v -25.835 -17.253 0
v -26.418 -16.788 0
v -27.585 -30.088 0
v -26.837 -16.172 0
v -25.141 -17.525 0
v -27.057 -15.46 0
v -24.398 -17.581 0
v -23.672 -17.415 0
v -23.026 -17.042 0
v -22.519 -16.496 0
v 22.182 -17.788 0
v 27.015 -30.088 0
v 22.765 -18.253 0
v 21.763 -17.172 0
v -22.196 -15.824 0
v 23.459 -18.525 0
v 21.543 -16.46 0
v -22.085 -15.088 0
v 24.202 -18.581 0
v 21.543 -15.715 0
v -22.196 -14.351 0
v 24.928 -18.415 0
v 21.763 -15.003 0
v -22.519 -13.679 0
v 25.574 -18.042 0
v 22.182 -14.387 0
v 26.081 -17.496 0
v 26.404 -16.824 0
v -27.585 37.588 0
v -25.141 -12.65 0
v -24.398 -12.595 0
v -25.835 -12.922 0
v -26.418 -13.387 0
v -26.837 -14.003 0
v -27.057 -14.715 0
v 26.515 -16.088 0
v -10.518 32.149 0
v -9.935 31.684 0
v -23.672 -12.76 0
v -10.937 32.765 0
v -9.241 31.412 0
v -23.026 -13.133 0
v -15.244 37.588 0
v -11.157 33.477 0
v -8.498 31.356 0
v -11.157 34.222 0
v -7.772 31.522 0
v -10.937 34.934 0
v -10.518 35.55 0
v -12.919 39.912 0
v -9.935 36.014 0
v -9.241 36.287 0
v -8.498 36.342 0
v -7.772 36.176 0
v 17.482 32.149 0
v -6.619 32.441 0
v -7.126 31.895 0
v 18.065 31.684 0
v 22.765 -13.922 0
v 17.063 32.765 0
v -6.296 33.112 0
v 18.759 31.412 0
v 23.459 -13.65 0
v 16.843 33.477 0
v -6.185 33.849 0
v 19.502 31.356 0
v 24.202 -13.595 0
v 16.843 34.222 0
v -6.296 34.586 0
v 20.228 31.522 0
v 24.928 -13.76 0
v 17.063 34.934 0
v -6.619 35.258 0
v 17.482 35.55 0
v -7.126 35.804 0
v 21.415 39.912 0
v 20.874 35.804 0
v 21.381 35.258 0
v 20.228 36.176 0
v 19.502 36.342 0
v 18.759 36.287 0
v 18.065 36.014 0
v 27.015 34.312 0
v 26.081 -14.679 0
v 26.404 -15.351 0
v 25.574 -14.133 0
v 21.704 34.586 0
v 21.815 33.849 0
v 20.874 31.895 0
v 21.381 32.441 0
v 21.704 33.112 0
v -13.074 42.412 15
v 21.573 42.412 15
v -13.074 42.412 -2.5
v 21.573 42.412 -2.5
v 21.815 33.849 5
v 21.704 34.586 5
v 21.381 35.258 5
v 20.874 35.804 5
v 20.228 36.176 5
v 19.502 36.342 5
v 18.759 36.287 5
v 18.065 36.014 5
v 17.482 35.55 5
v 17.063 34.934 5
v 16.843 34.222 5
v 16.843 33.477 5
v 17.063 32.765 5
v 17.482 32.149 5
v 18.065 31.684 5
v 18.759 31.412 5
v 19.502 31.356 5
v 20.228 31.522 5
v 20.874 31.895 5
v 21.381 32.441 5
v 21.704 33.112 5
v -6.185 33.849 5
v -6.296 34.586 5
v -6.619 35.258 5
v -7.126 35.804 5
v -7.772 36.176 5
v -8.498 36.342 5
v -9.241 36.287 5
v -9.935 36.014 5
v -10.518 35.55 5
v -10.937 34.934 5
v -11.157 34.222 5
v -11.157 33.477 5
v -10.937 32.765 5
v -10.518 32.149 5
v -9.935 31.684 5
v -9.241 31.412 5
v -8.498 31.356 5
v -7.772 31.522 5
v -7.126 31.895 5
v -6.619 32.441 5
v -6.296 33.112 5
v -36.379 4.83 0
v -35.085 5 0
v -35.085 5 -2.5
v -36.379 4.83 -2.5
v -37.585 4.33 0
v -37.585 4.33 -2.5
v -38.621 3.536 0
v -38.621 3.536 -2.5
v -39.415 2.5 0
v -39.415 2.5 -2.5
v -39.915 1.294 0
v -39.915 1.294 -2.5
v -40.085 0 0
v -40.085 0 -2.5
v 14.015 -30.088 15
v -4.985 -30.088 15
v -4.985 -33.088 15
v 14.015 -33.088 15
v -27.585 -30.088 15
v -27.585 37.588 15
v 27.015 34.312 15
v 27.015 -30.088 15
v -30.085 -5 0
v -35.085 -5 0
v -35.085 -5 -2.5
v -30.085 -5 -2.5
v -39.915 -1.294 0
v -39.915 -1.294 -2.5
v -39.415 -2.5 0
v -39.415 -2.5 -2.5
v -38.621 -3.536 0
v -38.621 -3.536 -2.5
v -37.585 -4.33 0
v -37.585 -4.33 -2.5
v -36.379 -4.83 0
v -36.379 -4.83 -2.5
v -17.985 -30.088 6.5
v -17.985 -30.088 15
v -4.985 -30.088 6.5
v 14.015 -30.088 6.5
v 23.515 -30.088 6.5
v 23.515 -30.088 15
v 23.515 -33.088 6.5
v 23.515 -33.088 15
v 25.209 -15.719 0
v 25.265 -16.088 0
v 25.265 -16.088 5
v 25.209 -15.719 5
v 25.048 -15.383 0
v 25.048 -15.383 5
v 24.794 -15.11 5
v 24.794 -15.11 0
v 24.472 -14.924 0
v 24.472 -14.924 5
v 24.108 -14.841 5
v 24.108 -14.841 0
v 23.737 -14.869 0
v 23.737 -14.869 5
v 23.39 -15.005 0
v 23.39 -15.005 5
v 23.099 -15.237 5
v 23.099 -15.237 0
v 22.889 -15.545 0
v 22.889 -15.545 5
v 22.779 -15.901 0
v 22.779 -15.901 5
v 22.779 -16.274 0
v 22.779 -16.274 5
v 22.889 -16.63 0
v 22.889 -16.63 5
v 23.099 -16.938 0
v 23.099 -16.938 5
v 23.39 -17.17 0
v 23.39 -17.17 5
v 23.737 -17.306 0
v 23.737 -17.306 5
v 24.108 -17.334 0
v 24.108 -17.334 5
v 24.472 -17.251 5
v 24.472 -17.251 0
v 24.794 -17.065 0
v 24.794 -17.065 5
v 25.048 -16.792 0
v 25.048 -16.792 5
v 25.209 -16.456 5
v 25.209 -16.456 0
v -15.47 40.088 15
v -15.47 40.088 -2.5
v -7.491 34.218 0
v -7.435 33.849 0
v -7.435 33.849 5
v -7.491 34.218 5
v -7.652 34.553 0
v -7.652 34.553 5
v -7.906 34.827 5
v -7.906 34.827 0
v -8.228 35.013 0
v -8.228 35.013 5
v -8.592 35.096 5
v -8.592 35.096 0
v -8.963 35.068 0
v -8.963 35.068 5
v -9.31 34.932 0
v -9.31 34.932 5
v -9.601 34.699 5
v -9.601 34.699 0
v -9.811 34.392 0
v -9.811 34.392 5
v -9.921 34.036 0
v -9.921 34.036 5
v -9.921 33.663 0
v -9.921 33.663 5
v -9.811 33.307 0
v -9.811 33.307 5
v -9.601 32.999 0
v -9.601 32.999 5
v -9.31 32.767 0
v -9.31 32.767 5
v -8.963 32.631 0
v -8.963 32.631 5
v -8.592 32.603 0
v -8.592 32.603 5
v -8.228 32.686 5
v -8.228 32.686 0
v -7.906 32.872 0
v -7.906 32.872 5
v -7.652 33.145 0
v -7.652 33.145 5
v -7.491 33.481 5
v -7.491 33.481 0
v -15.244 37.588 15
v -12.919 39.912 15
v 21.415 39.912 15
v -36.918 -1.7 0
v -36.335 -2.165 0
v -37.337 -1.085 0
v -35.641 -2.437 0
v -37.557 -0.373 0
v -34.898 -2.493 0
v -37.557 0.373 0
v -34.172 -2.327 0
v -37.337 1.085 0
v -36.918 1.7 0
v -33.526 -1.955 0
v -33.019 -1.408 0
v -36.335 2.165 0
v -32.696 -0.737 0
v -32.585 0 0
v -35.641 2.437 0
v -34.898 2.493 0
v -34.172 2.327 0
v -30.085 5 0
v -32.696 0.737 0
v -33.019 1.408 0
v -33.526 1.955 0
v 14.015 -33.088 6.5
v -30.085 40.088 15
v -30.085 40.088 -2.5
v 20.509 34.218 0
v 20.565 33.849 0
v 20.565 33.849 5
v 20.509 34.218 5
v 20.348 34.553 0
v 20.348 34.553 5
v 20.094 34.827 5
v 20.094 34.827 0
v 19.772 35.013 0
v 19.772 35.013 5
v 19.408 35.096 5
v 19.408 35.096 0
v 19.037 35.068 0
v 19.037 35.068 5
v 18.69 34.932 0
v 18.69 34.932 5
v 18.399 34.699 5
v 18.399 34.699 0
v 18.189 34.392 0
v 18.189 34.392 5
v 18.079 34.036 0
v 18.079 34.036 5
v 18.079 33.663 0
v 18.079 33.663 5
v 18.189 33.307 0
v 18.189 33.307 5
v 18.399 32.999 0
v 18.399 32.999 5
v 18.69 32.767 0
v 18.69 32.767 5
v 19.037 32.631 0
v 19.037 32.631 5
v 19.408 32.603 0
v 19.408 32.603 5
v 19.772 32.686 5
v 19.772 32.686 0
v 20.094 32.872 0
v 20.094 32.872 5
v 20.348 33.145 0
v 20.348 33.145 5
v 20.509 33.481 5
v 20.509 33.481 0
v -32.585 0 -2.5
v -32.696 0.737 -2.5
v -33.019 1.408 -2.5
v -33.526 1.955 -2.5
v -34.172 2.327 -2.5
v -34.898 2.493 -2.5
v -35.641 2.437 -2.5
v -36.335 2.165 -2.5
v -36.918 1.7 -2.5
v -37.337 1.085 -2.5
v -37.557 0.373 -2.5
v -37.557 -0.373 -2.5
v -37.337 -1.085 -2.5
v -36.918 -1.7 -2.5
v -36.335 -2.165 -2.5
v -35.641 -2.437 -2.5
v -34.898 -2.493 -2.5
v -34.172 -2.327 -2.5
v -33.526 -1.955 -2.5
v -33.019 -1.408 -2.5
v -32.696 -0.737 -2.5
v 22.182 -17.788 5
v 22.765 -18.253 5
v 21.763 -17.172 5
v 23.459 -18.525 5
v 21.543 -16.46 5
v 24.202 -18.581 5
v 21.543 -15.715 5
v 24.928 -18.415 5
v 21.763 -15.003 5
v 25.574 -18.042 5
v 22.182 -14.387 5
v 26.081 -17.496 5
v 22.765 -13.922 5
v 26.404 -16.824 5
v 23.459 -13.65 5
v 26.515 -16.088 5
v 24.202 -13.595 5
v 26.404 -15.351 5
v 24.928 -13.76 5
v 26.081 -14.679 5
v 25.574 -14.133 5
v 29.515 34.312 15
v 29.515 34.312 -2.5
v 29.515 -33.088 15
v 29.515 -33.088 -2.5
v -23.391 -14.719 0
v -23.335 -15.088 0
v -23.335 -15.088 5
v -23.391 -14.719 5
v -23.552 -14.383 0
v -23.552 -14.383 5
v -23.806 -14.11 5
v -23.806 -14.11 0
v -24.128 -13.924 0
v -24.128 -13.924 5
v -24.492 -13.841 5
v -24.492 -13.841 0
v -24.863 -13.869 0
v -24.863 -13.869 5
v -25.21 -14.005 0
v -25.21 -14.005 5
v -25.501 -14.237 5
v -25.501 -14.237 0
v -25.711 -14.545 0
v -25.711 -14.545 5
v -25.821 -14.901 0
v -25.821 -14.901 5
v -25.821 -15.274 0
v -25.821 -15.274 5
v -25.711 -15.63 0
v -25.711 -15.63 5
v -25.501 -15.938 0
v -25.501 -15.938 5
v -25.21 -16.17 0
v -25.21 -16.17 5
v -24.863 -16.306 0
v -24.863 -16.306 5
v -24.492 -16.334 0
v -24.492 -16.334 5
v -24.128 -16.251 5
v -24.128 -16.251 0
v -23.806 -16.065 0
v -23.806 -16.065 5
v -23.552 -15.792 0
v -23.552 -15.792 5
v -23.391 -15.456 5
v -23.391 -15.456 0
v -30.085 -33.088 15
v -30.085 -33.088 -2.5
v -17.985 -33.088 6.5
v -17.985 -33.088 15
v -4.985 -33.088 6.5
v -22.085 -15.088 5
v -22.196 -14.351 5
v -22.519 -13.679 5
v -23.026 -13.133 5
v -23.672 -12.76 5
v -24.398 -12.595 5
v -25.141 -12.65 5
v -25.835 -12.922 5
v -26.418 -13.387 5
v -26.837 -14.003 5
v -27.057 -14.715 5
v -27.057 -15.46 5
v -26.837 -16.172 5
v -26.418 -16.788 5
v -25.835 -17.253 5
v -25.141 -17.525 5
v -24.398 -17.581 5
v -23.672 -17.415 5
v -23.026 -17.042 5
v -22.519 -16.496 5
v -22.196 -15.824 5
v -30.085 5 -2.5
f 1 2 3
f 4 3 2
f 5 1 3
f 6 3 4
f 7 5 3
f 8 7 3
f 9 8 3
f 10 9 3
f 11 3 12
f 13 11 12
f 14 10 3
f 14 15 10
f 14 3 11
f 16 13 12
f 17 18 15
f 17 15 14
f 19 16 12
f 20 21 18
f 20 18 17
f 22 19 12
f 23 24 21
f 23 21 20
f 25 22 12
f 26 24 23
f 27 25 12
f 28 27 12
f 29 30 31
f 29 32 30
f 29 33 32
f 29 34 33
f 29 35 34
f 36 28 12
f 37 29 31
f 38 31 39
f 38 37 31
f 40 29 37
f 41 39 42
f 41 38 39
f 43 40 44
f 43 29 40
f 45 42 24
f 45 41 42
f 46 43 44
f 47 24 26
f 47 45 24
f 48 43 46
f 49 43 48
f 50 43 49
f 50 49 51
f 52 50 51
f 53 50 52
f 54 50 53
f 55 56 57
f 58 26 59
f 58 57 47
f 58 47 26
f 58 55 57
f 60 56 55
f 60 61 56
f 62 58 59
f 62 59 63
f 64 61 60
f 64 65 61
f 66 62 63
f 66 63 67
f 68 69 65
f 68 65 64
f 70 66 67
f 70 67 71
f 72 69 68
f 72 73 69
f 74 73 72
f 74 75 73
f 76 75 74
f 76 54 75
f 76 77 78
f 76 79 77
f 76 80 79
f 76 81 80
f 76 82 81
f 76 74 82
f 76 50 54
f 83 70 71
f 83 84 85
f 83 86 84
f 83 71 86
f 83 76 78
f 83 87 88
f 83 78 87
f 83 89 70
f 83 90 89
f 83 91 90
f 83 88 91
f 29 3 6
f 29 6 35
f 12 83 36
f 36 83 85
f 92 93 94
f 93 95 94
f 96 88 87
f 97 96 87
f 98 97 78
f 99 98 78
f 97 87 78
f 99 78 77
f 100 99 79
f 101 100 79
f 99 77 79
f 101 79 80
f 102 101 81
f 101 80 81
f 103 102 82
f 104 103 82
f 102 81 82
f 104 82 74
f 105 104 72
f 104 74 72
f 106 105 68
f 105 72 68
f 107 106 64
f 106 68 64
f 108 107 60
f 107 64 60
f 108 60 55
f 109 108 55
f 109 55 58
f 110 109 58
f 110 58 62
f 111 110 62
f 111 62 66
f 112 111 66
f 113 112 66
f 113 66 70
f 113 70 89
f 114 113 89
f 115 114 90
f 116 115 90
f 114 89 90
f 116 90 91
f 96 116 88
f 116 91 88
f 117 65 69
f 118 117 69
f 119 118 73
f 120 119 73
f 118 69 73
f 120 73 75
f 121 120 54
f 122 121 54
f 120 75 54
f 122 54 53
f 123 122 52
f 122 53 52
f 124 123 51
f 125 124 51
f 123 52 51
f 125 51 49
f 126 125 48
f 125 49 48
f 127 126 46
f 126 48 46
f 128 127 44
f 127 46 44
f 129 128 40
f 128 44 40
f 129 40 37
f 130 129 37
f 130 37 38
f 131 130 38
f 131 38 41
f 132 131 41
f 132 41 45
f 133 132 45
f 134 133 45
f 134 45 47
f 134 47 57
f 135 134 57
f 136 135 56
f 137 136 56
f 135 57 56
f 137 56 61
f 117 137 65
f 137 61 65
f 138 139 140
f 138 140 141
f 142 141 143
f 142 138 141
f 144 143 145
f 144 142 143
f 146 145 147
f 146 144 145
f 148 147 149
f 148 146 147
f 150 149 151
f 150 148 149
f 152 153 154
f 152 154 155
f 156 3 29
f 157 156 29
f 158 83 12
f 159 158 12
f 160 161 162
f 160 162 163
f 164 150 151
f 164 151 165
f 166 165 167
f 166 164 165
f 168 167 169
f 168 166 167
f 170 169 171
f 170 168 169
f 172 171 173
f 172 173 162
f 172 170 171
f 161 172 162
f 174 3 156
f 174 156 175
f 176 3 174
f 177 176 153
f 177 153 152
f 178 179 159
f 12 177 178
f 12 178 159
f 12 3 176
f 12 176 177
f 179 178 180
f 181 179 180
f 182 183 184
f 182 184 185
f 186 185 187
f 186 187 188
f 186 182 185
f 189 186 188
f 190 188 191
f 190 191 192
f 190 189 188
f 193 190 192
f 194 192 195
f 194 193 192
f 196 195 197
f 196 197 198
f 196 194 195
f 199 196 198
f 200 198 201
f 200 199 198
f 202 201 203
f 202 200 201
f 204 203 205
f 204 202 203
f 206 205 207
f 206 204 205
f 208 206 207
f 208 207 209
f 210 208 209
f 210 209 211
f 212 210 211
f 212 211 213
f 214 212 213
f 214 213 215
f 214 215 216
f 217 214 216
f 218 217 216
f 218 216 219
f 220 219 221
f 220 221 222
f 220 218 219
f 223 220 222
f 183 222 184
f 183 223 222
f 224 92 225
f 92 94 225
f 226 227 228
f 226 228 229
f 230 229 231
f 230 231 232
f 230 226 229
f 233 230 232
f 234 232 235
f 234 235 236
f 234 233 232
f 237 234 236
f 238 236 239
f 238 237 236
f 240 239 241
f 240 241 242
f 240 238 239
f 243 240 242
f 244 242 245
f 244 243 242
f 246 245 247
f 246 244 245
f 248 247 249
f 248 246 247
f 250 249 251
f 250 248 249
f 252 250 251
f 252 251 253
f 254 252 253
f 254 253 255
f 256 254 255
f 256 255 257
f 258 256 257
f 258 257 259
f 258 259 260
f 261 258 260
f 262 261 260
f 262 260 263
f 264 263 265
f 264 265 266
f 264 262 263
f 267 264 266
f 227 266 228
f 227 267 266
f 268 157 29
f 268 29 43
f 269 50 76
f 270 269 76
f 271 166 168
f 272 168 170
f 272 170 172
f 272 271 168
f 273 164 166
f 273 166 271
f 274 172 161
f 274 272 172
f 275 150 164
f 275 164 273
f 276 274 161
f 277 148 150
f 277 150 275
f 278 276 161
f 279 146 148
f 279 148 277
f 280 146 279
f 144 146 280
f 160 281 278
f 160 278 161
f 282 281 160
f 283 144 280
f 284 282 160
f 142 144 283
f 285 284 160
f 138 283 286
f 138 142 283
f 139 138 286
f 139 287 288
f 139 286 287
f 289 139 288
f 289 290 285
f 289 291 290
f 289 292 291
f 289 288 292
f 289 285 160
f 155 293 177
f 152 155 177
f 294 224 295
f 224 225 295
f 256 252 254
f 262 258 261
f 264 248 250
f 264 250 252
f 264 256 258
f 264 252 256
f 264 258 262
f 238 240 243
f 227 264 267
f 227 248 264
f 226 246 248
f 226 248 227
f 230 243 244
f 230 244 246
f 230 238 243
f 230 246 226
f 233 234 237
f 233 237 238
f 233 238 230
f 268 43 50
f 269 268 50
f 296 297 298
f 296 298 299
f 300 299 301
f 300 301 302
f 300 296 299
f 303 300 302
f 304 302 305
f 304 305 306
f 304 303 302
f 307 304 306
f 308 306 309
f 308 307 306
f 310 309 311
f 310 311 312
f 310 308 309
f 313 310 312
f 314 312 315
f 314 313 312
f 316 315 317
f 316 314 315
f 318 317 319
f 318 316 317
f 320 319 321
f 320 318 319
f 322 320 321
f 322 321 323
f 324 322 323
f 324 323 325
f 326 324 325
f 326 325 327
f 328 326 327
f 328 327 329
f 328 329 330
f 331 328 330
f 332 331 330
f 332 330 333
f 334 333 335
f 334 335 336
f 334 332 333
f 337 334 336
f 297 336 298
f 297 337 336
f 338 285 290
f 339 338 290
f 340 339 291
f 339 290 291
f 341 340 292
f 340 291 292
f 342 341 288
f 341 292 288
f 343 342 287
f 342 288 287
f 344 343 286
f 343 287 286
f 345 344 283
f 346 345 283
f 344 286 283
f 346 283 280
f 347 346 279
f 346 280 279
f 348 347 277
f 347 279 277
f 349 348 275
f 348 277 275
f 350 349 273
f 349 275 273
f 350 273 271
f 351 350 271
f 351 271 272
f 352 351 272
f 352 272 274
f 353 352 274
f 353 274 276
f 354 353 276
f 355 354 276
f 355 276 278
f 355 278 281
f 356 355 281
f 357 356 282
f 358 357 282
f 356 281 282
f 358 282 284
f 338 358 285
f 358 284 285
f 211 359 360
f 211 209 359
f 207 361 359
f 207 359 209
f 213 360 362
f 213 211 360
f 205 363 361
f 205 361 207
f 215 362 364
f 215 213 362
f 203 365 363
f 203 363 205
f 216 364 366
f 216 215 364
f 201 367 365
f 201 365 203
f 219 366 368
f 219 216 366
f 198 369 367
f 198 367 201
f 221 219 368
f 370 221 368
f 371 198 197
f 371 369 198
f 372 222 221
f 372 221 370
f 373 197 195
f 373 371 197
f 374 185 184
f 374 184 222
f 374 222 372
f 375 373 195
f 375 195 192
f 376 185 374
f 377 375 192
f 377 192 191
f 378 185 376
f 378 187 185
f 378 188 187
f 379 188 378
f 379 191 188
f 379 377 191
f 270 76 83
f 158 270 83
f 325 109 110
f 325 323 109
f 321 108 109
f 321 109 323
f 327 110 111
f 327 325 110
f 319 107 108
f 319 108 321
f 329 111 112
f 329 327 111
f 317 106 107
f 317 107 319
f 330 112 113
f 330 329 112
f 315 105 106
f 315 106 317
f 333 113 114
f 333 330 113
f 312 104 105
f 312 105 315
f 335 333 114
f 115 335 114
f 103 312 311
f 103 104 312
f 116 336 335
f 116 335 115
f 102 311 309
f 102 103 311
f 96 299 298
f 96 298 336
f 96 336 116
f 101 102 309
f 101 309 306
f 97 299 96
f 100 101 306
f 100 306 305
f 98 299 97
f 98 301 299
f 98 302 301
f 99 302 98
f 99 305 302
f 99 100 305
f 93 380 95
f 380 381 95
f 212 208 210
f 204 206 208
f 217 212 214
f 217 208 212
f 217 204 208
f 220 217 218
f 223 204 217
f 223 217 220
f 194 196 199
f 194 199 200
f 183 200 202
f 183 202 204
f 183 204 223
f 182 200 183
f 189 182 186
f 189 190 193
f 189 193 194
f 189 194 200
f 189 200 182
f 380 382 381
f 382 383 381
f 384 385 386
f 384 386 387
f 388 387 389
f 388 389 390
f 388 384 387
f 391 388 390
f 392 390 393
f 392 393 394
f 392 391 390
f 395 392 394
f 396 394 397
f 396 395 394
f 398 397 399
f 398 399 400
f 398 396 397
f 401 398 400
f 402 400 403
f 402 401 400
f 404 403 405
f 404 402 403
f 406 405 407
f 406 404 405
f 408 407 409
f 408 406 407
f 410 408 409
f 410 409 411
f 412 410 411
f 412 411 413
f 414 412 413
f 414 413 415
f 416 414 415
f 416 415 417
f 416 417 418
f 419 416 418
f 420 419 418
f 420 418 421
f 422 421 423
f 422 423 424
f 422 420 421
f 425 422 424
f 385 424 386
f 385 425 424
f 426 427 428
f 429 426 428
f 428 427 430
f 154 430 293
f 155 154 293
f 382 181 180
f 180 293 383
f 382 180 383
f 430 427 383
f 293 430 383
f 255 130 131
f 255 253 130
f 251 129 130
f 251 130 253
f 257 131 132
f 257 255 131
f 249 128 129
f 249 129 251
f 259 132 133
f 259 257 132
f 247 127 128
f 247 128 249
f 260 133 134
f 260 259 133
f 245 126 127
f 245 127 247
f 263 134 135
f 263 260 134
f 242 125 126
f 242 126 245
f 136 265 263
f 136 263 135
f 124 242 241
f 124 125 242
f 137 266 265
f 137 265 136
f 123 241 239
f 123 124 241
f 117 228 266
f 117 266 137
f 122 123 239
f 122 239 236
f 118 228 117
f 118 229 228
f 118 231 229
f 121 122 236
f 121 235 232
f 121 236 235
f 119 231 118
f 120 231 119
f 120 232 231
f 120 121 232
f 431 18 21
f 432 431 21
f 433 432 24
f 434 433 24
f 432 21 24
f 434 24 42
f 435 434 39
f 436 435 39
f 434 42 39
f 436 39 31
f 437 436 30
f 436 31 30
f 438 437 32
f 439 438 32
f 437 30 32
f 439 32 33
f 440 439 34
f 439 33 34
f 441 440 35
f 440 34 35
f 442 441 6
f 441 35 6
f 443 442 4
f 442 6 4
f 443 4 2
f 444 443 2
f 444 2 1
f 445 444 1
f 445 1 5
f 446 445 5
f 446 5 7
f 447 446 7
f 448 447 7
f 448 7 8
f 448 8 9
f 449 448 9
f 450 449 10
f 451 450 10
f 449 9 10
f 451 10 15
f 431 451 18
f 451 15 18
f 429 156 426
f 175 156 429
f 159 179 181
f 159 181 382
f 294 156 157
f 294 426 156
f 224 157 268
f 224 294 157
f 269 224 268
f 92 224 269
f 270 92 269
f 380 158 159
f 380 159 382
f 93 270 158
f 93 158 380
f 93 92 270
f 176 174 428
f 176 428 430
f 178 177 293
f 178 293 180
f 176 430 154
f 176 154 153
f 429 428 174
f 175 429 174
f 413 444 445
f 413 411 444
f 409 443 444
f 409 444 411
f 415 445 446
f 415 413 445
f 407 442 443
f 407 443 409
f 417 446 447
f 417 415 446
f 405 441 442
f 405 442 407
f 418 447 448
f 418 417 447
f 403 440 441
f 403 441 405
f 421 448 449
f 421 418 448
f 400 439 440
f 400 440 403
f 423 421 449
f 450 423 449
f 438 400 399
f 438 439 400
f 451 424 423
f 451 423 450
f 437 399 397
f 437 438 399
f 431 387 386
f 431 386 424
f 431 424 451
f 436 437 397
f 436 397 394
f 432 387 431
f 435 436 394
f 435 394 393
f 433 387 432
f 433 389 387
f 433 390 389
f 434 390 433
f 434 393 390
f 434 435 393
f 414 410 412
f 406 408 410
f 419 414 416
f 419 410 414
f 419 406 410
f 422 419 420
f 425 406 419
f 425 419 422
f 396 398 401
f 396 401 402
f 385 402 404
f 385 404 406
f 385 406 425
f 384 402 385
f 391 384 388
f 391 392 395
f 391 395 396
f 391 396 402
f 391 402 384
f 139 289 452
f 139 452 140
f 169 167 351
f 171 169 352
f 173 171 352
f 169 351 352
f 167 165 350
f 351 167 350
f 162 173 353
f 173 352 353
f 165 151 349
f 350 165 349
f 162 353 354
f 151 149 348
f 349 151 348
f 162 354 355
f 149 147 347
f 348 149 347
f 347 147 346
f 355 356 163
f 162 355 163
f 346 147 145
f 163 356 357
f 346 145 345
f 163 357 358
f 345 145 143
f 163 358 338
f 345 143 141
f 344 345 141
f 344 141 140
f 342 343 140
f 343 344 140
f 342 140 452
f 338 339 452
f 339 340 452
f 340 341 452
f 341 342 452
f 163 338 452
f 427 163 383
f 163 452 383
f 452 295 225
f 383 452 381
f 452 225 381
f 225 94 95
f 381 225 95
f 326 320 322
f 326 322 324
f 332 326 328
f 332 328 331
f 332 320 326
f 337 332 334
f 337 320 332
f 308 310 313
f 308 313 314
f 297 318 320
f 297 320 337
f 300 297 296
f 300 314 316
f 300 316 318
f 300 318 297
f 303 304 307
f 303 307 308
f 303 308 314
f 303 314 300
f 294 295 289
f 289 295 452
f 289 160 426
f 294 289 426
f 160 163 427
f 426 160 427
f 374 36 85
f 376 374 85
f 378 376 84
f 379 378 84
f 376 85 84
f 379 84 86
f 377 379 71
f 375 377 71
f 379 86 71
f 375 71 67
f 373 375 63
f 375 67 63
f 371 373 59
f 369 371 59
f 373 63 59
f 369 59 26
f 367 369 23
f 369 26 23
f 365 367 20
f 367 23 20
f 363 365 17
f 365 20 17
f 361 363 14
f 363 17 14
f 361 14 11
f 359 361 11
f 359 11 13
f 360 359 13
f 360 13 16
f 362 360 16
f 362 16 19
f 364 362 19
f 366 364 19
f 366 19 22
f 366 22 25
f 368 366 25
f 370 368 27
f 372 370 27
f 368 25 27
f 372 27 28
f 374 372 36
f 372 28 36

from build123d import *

# Parameters (mm, degrees)
F0_R     = 2.5
F0_W     = 19
F0_H     = 3
F0_W_2   = 13
F0_W_3   = 9.5
F0_R_2   = 1.25
F1_DEPTH = 2.5
F2_DEPTH = 15
F3_DEPTH = 6.5
F4_DEPTH = 2.5
F5_DEPTH = 5


# Not quite as in the source:
# - a feature names something its author has since deleted; it is built from what else it names


with BuildPart() as f1:
    # F0 (on Top) → F1 (new body)
    with BuildSketch(Plane.XY):
        Polygon((27.0149873525, -30.0875452161), (27.0149873525, 34.3124547839), (21.4149873525, 39.9124547839), (-12.9189450768, 39.9124547839), (-15.2438546447, 37.5875452161), (-27.5850126475, 37.5875452161), (-27.5850126475, -30.0875452161), (-17.9850126475, -30.0875452161), (-4.9850126475, -30.0875452161), (14.0149873525, -30.0875452161), (23.5149873525, -30.0875452161), align=None)
        with Locations((-24.5850126475, -15.0875452161)):
            Circle(F0_R, mode=Mode.SUBTRACT)
        with Locations((24.0149873525, -16.0875452161)):
            Circle(F0_R, mode=Mode.SUBTRACT)
        with Locations((-8.6850126475, 33.8492766023)):
            Circle(F0_R, mode=Mode.SUBTRACT)
        with Locations((19.3149873525, 33.8492766023)):
            Circle(F0_R, mode=Mode.SUBTRACT)
        Polygon((21.4149873525, 39.9124547839), (27.0149873525, 34.3124547839), (27.0149873525, -30.0875452161), (29.5149873525, -30.0875452161), (29.5149873525, 34.3124547839), (21.5734839439, 42.4124547839), (-13.0739709929, 42.4124547839), (-15.4701419023, 40.0875452161), (-30.0850126475, 40.0875452161), (-30.0850126475, 10), (-30.0850126475, 5), (-30.0850126475, 0), (-30.0850126475, -5), (-30.0850126475, -30.0875452161), (-27.5850126475, -30.0875452161), (-27.5850126475, 37.5875452161), (-15.2438546447, 37.5875452161), (-12.9189450768, 39.9124547839), align=None)
        with Locations((4.5149873525, -31.5875452161)):
            Rectangle(F0_W, F0_H)
        with Locations((-11.4850126475, -31.5875452161)):
            Rectangle(F0_W_2, F0_H)
        Polygon((-17.9850126475, -33.0875452161), (-17.9850126475, -30.0875452161), (-27.5850126475, -30.0875452161), (-30.0850126475, -30.0875452161), (-30.0850126475, -33.0875452161), align=None)
        with Locations((18.7649873525, -31.5875452161)):
            Rectangle(F0_W_3, F0_H)
        with Locations((19.3149873525, 33.8492766023)):
            Circle(F0_R)
        with Locations((19.3149873525, 33.8492766023)):
            Circle(F0_R_2, mode=Mode.SUBTRACT)
        with Locations((-24.5850126475, -15.0875452161)):
            Circle(F0_R)
        with Locations((-24.5850126475, -15.0875452161)):
            Circle(F0_R_2, mode=Mode.SUBTRACT)
        with Locations((24.0149873525, -16.0875452161)):
            Circle(F0_R)
        with Locations((24.0149873525, -16.0875452161)):
            Circle(F0_R_2, mode=Mode.SUBTRACT)
        with Locations((-8.6850126475, 33.8492766023)):
            Circle(F0_R)
        with Locations((-8.6850126475, 33.8492766023)):
            Circle(F0_R_2, mode=Mode.SUBTRACT)
        Polygon((29.5149873525, -30.0875452161), (27.0149873525, -30.0875452161), (23.5149873525, -30.0875452161), (23.5149873525, -33.0875452161), (29.5149873525, -33.0875452161), align=None)
        with Locations((-24.5850126475, -15.0875452161)):
            Circle(F0_R_2)
        with Locations((24.0149873525, -16.0875452161)):
            Circle(F0_R_2)
        with Locations((-8.6850126475, 33.8492766023)):
            Circle(F0_R_2)
        with Locations((19.3149873525, 33.8492766023)):
            Circle(F0_R_2)
    extrude(amount=-F1_DEPTH)

    # F0 (on Top) → F2 (join)
    with BuildSketch(Plane.XY):
        Polygon((21.4149873525, 39.9124547839), (27.0149873525, 34.3124547839), (27.0149873525, -30.0875452161), (29.5149873525, -30.0875452161), (29.5149873525, 34.3124547839), (21.5734839439, 42.4124547839), (-13.0739709929, 42.4124547839), (-15.4701419023, 40.0875452161), (-30.0850126475, 40.0875452161), (-30.0850126475, 10), (-30.0850126475, 5), (-30.0850126475, 0), (-30.0850126475, -5), (-30.0850126475, -30.0875452161), (-27.5850126475, -30.0875452161), (-27.5850126475, 37.5875452161), (-15.2438546447, 37.5875452161), (-12.9189450768, 39.9124547839), align=None)
        Polygon((-17.9850126475, -33.0875452161), (-17.9850126475, -30.0875452161), (-27.5850126475, -30.0875452161), (-30.0850126475, -30.0875452161), (-30.0850126475, -33.0875452161), align=None)
        with Locations((4.5149873525, -31.5875452161)):
            Rectangle(F0_W, F0_H)
        Polygon((29.5149873525, -30.0875452161), (27.0149873525, -30.0875452161), (23.5149873525, -30.0875452161), (23.5149873525, -33.0875452161), (29.5149873525, -33.0875452161), align=None)
    extrude(amount=F2_DEPTH)

    # F0 (on Top) → F3 (join)
    with BuildSketch(Plane.XY):
        with Locations((-11.4850126475, -31.5875452161)):
            Rectangle(F0_W_2, F0_H)
        with Locations((18.7649873525, -31.5875452161)):
            Rectangle(F0_W_3, F0_H)
    extrude(amount=F3_DEPTH)

    # F0 (on Top) → F4 (join)
    with BuildSketch(Plane.XY):
        with BuildLine():
            Line((-35.0850126475, -5), (-30.0850126475, -5))
            Line((-30.0850126475, -5), (-30.0850126475, 0))
            Line((-30.0850126475, 0), (-30.0850126475, 5))
            Line((-30.0850126475, 5), (-35.0850126475, 5))
            ThreePointArc((-35.0850126475, 5), (-38.6205465534, 3.5355339059), (-40.0850126475, 0))
            ThreePointArc((-40.0850126475, 0), (-38.6205465534, -3.5355339059), (-35.0850126475, -5))
        make_face()
        with Locations((-35.0850126475, 0)):
            Circle(F0_R, mode=Mode.SUBTRACT)
    extrude(amount=-F4_DEPTH)

    # F0 (on Top) → F5 (join)
    with BuildSketch(Plane.XY):
        with Locations((-24.5850126475, -15.0875452161)):
            Circle(F0_R)
        with Locations((-24.5850126475, -15.0875452161)):
            Circle(F0_R_2, mode=Mode.SUBTRACT)
        with Locations((-8.6850126475, 33.8492766023)):
            Circle(F0_R)
        with Locations((-8.6850126475, 33.8492766023)):
            Circle(F0_R_2, mode=Mode.SUBTRACT)
        with Locations((19.3149873525, 33.8492766023)):
            Circle(F0_R)
        with Locations((19.3149873525, 33.8492766023)):
            Circle(F0_R_2, mode=Mode.SUBTRACT)
        with Locations((24.0149873525, -16.0875452161)):
            Circle(F0_R)
        with Locations((24.0149873525, -16.0875452161)):
            Circle(F0_R_2, mode=Mode.SUBTRACT)
    extrude(amount=F5_DEPTH)


solid = f1.part
